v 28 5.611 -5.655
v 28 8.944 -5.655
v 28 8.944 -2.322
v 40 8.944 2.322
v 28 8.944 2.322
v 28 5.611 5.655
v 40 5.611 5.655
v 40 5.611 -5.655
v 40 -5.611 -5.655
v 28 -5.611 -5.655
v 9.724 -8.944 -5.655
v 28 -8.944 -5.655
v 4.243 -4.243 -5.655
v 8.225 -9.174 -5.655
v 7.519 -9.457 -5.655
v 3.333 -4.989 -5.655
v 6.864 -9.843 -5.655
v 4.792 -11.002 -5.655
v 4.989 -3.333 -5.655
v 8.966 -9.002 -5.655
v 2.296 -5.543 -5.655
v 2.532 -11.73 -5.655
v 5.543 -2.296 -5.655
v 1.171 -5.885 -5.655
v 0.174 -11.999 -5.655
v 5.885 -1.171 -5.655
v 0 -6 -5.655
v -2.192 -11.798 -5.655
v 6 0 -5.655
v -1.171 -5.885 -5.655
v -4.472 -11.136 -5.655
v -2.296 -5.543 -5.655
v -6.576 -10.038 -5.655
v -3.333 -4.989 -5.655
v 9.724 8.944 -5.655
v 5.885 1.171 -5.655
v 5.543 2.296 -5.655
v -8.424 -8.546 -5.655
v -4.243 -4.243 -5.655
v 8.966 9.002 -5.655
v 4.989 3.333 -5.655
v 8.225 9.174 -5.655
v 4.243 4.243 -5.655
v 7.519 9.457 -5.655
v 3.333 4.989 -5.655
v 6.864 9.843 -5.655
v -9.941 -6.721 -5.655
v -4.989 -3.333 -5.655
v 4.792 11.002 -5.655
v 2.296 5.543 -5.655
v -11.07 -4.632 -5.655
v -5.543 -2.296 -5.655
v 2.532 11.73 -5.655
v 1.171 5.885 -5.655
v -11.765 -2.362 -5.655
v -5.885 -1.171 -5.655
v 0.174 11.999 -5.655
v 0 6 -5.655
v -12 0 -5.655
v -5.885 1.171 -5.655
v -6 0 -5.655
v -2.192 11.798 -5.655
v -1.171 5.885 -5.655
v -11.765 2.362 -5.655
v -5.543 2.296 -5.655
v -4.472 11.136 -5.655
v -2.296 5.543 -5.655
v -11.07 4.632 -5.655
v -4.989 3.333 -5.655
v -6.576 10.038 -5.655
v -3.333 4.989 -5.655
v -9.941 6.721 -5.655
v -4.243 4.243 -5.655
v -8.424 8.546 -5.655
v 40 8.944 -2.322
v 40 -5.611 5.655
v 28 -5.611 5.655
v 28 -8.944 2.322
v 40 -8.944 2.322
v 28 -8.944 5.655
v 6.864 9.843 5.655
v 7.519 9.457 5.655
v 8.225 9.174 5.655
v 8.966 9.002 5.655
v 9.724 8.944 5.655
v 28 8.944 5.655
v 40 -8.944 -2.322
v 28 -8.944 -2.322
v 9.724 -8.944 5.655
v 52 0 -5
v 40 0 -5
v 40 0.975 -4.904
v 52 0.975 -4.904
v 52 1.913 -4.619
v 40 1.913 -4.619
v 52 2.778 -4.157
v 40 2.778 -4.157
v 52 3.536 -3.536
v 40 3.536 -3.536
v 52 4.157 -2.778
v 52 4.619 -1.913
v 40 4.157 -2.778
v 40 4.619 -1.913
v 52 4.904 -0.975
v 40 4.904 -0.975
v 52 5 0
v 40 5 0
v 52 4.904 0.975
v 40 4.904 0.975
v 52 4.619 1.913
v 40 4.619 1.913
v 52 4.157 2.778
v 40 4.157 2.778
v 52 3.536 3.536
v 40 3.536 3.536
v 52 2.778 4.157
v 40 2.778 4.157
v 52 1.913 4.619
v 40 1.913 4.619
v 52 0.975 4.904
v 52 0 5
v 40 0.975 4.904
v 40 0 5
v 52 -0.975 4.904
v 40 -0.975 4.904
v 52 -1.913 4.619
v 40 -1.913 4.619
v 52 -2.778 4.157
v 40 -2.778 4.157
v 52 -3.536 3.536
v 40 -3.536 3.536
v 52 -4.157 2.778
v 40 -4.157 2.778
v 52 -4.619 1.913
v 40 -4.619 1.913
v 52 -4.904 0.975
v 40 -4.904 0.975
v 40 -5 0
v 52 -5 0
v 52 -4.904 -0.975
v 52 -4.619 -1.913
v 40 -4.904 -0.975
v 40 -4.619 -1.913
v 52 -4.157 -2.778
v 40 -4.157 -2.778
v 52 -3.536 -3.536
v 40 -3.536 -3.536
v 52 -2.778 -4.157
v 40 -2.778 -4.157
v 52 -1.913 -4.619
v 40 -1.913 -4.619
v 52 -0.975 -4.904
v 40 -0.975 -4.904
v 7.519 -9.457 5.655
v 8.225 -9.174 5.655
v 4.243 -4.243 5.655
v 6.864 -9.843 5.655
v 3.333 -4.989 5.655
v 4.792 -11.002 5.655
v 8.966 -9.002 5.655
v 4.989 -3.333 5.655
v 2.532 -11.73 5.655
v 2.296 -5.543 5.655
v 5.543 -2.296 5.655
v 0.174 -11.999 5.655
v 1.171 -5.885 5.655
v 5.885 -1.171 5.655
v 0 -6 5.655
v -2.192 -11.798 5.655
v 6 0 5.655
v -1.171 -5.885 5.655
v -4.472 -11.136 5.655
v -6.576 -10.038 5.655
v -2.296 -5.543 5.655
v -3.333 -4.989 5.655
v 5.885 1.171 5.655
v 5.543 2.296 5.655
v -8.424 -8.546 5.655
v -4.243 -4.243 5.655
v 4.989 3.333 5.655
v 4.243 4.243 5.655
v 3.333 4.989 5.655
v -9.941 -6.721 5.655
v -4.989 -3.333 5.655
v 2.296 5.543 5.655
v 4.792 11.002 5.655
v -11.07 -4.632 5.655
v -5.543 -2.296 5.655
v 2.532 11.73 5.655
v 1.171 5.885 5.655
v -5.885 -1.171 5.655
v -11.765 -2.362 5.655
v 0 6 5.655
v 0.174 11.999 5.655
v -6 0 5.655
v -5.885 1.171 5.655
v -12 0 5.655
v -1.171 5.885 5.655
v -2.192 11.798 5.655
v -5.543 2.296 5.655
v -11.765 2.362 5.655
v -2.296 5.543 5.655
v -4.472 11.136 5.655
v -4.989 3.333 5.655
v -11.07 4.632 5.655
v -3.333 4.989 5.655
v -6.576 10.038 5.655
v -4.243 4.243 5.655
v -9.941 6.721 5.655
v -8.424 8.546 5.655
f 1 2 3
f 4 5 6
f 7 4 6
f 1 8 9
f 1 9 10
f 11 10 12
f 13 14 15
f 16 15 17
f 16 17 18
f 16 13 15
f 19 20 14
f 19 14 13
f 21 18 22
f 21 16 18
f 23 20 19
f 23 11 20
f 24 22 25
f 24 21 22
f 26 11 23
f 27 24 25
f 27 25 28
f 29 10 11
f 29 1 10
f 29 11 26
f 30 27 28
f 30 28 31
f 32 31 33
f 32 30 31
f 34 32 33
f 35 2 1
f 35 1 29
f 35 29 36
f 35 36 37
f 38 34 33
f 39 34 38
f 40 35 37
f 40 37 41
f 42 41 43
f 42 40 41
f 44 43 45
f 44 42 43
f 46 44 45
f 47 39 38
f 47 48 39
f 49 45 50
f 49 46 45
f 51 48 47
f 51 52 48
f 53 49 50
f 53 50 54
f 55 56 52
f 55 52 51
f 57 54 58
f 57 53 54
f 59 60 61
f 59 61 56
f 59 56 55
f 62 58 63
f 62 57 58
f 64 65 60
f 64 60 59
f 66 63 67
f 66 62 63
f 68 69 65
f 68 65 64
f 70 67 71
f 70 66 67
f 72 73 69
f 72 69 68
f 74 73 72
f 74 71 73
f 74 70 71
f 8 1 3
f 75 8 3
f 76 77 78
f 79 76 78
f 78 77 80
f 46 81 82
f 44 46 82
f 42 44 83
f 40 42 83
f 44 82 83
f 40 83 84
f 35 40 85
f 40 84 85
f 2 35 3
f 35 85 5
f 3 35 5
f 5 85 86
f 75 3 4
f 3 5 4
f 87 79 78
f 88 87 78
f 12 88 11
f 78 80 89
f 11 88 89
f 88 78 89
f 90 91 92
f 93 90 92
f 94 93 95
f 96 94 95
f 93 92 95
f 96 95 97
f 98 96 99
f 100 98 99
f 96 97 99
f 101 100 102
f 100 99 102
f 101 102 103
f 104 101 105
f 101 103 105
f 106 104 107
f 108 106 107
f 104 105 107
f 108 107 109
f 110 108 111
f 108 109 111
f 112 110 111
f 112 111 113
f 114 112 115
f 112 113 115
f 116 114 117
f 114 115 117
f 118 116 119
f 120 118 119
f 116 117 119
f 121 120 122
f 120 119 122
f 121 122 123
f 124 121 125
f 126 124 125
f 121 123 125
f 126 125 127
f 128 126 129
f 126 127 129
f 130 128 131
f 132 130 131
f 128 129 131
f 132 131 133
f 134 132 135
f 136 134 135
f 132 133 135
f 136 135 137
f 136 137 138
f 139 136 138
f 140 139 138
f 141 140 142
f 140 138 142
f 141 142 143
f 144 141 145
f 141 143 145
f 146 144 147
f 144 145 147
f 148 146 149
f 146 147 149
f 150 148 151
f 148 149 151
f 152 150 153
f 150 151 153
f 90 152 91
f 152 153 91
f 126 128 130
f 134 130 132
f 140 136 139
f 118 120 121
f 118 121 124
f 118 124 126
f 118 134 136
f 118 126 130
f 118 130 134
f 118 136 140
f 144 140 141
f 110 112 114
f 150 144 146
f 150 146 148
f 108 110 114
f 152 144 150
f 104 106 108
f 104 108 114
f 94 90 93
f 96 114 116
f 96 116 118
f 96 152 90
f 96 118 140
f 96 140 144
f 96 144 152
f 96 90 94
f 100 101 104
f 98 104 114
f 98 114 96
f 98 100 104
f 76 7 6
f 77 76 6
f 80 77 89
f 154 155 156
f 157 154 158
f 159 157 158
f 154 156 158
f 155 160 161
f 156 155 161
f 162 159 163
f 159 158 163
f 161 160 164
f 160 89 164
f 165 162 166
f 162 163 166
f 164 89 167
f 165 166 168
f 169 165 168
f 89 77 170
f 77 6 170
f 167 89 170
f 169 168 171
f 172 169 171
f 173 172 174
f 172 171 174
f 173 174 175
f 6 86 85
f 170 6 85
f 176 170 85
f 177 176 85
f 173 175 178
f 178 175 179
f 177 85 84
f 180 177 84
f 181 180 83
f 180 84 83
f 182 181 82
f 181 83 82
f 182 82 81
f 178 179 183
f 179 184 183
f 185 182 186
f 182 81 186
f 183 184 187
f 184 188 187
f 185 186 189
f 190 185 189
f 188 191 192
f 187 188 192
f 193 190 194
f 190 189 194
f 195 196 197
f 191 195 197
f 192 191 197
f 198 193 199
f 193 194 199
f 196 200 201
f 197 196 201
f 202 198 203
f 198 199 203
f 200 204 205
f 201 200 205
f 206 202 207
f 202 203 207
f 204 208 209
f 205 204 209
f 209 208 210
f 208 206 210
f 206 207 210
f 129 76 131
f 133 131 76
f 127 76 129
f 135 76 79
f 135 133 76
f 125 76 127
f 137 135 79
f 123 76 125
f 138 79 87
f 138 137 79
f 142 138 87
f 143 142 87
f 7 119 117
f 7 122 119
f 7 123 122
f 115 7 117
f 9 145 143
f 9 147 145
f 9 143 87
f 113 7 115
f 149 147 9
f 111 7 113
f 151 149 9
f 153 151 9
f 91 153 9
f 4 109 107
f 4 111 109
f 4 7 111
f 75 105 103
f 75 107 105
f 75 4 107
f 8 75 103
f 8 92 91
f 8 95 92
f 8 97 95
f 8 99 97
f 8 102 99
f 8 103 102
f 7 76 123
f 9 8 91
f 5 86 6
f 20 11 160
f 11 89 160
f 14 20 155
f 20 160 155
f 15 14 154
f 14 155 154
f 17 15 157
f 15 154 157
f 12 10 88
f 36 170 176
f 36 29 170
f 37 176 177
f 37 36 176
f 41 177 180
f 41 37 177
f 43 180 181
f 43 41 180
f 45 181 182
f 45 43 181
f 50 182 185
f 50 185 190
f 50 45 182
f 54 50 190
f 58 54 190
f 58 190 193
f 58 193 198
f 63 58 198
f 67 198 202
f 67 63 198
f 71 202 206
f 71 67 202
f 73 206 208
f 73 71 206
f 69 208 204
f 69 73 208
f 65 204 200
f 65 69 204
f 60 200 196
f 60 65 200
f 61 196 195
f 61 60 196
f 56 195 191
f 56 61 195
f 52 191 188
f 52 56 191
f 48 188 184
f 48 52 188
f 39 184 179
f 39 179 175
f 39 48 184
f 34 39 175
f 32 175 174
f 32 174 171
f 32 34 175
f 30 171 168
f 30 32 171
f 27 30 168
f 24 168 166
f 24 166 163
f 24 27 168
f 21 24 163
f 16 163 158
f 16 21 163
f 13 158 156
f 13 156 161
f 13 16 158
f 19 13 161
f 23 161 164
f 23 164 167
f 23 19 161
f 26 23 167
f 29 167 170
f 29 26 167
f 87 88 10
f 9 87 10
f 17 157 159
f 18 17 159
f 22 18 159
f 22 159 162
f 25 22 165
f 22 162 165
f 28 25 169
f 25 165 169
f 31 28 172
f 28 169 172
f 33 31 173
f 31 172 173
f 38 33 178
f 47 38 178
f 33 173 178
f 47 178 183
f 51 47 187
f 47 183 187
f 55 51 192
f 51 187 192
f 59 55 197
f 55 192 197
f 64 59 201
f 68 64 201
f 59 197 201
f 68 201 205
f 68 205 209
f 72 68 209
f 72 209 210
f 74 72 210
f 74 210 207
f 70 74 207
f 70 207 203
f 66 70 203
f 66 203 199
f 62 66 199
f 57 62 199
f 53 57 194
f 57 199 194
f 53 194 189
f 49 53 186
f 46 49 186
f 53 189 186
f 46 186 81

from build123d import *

# Parameters (mm, degrees)
SKETCH1_R           = 6
BOSS_EXTRUDE1_DEPTH = 5.655
BOSS_EXTRUDE2_DEPTH = 12
SKETCH3_R           = 5
BOSS_EXTRUDE3_DEPTH = 12


with BuildPart() as part:
    # Sketch1 → Boss-Extrude1 (new, symmetric)
    with BuildSketch(Plane.XY):
        with BuildLine():
            Line((9.724056813, 8.94427191), (28, 8.94427191))
            Line((28, 8.94427191), (28, -8.94427191))
            Line((28, -8.94427191), (9.724056813, -8.94427191))
            ThreePointArc((9.724056813, -8.94427191), (8.225104215, -9.174246636), (6.864040103, -9.843015466))
            ThreePointArc((6.864040103, -9.843015466), (-12, 0), (6.864040103, 9.843015466))
            ThreePointArc((6.864040103, 9.843015466), (8.225104215, 9.174246636), (9.724056813, 8.94427191))
        make_face()
        Circle(SKETCH1_R, mode=Mode.SUBTRACT)
    extrude(amount=BOSS_EXTRUDE1_DEPTH, both=True)

    # Sketch2 → Boss-Extrude2 (add)
    with BuildSketch(Plane(origin=(28, 0, 0), x_dir=(0, 0, -1), z_dir=(1, 0, 0))):
        Polygon((2.321666667, 8.94427191), (-2.321666667, 8.94427191), (-5.655, 5.610938577), (-5.655, -5.610938577), (-2.321666667, -8.94427191), (2.321666667, -8.94427191), (5.655, -5.610938577), (5.655, 5.610938577), align=None)
    extrude(amount=BOSS_EXTRUDE2_DEPTH)

    # Sketch3 → Boss-Extrude3 (add)
    with BuildSketch(Plane(origin=(40, 0, 0), x_dir=(0, 0, -1), z_dir=(1, 0, 0))):
        Circle(SKETCH3_R)
    extrude(amount=BOSS_EXTRUDE3_DEPTH)


solid = part.part
